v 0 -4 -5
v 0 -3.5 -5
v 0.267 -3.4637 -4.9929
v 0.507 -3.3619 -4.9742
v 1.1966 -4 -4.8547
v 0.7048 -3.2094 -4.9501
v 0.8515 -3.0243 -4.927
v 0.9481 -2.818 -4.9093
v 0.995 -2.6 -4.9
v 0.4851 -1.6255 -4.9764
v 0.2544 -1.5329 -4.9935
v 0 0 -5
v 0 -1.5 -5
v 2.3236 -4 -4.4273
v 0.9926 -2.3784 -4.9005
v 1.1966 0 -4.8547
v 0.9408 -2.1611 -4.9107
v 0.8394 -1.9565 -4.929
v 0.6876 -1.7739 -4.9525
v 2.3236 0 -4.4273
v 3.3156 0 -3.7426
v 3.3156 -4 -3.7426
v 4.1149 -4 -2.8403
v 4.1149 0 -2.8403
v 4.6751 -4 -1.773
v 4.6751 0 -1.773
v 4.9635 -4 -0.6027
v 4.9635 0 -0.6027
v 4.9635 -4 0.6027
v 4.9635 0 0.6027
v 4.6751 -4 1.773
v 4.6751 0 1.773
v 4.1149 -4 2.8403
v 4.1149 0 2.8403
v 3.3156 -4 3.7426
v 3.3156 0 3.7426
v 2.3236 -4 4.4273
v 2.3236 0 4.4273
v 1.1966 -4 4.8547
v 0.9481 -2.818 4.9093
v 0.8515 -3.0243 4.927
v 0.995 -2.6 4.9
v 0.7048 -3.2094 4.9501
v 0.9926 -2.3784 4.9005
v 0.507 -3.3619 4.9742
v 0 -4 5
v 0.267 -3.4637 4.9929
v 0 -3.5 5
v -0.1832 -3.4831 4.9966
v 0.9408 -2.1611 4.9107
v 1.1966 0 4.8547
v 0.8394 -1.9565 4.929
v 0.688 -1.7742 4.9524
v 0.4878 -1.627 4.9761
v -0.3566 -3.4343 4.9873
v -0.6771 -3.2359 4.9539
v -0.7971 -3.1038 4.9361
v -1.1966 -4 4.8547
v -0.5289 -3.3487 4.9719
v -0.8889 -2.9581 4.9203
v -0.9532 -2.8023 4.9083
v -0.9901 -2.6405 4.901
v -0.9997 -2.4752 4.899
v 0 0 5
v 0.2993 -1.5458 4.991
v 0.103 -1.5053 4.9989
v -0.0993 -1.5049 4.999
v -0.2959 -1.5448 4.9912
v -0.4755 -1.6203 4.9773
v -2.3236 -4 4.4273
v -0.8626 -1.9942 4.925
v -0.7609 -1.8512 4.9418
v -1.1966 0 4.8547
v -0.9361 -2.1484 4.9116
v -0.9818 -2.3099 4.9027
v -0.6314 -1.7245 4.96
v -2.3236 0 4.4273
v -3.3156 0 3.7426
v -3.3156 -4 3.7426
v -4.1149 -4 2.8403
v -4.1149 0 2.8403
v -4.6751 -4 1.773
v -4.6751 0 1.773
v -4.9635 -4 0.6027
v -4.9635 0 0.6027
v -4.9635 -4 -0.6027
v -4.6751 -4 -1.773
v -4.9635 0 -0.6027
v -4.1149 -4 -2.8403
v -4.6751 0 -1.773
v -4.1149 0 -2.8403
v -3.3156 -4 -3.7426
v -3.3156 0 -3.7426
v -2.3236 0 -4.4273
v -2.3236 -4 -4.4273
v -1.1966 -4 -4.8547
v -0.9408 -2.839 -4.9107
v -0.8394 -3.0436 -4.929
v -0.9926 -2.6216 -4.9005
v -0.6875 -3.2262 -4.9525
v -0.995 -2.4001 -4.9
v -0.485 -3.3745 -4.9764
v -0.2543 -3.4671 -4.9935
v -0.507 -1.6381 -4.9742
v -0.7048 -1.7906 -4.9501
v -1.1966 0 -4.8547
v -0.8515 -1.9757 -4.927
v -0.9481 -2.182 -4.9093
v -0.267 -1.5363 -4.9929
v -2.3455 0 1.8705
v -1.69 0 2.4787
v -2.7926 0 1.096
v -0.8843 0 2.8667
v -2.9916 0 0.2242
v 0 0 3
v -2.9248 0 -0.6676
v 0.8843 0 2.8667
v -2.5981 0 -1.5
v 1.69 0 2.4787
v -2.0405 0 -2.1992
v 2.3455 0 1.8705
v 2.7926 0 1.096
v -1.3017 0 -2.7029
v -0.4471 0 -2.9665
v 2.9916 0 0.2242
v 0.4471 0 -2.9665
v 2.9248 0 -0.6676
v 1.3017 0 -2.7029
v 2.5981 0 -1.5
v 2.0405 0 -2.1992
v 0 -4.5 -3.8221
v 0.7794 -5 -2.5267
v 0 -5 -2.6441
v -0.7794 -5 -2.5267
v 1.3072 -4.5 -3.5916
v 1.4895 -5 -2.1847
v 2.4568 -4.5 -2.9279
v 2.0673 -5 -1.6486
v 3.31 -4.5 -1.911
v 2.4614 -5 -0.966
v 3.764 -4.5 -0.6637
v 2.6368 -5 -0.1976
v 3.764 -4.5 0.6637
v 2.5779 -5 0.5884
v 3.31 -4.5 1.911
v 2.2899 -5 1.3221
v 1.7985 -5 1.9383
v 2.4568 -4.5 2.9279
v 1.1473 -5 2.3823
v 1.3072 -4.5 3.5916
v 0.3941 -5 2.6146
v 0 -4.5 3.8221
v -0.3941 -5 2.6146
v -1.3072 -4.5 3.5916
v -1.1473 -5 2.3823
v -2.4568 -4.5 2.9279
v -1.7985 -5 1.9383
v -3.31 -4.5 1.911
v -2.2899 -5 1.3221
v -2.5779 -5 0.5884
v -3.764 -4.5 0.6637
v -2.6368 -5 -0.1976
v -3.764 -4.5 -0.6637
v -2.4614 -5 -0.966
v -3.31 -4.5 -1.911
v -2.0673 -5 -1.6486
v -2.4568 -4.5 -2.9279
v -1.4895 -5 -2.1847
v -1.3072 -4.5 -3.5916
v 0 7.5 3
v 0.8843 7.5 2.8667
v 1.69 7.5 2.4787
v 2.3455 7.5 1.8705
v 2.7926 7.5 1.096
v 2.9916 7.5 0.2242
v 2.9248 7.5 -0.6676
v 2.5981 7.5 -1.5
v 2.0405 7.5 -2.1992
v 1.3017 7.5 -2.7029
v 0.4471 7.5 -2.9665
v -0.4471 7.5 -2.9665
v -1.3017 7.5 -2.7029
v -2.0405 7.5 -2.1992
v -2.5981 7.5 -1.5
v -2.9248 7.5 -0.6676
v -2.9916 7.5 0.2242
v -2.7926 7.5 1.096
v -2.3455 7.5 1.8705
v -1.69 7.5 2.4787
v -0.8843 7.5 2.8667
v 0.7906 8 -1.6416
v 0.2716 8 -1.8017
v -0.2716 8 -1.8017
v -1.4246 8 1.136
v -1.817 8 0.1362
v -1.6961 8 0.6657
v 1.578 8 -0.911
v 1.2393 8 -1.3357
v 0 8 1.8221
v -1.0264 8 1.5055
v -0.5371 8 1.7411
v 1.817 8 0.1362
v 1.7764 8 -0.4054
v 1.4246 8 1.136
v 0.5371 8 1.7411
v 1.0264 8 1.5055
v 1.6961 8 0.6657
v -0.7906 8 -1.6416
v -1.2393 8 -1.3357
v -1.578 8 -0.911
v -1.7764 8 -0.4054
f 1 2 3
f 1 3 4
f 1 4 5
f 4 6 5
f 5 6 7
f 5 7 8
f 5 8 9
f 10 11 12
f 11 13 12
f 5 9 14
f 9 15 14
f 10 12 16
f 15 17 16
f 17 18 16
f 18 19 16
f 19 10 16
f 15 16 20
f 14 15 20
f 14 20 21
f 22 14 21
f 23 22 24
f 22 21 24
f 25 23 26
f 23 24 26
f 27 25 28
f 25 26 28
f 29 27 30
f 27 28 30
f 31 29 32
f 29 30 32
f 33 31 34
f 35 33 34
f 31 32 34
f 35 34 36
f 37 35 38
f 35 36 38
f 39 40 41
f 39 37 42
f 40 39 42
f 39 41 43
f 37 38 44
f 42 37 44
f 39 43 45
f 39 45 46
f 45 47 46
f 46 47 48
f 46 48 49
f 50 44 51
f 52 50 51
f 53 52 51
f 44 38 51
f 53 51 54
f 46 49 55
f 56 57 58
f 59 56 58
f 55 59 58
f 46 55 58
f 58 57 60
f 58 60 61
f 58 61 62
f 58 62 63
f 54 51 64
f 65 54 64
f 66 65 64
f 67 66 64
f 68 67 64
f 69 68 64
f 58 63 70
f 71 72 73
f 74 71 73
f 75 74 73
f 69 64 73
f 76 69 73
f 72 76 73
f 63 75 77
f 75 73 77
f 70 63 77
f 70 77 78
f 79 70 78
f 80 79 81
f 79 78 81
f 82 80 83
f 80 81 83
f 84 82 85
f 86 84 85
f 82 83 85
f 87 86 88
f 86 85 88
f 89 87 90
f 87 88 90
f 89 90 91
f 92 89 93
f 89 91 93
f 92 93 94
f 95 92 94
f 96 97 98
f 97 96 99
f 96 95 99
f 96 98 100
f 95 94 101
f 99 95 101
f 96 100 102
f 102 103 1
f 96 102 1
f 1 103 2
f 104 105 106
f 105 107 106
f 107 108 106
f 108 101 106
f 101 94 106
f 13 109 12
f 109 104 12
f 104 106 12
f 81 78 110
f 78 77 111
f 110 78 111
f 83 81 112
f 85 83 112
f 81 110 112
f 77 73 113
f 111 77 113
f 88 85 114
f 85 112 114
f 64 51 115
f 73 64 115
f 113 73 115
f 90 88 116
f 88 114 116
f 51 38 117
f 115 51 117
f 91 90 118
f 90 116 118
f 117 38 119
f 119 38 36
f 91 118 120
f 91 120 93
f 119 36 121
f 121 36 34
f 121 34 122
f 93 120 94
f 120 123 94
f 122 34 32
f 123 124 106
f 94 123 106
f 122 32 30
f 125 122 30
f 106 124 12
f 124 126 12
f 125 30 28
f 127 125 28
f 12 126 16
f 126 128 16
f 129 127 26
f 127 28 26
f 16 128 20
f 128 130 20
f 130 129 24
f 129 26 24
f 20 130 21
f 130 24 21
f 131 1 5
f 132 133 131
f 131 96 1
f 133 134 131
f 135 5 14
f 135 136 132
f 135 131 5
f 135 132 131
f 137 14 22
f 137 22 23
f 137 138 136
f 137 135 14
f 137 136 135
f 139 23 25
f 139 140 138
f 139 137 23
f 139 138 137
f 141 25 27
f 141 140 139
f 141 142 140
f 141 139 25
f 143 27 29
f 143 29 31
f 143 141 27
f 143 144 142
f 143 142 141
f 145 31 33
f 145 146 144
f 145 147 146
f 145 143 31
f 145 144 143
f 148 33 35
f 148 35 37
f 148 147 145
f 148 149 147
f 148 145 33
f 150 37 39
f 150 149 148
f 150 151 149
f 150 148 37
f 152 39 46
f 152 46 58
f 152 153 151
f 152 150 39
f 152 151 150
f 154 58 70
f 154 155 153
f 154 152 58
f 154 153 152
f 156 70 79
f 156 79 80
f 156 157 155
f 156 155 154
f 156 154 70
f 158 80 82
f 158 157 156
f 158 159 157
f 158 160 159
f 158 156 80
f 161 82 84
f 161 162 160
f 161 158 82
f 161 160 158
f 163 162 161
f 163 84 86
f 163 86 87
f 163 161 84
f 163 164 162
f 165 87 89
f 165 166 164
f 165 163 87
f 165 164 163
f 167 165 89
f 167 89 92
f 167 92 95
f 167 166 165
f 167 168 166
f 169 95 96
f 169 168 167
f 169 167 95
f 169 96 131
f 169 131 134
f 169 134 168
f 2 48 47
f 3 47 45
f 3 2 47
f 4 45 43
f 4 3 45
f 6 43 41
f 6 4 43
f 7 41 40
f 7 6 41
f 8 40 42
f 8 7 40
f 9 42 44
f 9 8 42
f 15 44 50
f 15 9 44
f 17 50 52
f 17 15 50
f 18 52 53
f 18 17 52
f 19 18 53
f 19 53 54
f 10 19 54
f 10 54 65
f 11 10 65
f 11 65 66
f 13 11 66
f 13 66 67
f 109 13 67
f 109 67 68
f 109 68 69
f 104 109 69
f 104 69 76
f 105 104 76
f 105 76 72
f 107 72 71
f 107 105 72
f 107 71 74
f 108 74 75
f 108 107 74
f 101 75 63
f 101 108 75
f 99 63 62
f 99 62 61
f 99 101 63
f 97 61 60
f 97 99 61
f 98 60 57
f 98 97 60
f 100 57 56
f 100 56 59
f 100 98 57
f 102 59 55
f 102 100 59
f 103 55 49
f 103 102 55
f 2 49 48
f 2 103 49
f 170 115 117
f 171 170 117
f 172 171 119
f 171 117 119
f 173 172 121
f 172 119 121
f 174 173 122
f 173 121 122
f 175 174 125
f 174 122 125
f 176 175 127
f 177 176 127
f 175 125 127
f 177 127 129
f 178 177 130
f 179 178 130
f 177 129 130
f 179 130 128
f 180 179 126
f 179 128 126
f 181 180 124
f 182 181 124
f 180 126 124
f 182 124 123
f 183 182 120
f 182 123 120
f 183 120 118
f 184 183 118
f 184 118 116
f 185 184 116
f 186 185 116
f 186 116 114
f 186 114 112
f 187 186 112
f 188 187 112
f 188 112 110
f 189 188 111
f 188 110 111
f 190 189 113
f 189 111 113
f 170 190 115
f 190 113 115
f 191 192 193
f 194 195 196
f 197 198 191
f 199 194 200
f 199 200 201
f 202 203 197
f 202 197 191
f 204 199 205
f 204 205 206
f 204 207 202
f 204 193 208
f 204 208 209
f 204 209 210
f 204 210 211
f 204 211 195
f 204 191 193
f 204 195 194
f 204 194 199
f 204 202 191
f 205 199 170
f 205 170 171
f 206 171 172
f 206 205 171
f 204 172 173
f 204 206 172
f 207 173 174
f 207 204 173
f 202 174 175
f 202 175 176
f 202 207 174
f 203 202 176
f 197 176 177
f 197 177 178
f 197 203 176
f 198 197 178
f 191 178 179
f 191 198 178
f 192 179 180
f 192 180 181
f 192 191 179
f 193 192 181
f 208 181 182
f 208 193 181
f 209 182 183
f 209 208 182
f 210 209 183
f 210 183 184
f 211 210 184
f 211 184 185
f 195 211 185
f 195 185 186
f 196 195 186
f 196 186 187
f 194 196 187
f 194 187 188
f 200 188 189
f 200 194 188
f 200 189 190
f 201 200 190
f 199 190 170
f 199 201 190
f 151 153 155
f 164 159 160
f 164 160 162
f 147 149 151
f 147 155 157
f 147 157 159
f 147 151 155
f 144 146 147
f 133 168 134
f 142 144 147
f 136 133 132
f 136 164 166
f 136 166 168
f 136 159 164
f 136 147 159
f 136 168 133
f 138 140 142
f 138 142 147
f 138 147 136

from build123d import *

# Parameters (mm, degrees)
SKETCH1_R               = 3
BOSS_EXTRUDE1_DEPTH     = 8
SKETCH2_R               = 5
BOSS_EXTRUDE2_DEPTH     = 5
CUT_EXTRUDE1_DEPTH      = 11.677078252
CUT_EXTRUDE1_DEPTH_BACK = 11.677078252
SKETCH3_R               = 1
CHAMFER1_SIZE           = 1
CHAMFER1_SIZE2          = 2.355852366
CHAMFER2_SIZE           = 0.5
CHAMFER2_SIZE2          = 1.177926183


with BuildPart() as part:
    # Sketch1 → Boss-Extrude1 (new body)
    with BuildSketch(Plane(origin=(0, 0, 0), x_dir=(1, 0, 0), z_dir=(0, 1, 0))):
        with Locations(Location((0, 0, 0), (0, 0, 270))):
            Circle(SKETCH1_R)
    extrude(amount=BOSS_EXTRUDE1_DEPTH)

    # Sketch2 → Boss-Extrude2 (add)
    with BuildSketch(Plane.XZ):
        with Locations(Location((0, 0, 0), (0, 0, 270))):
            Circle(SKETCH2_R)
    extrude(amount=BOSS_EXTRUDE2_DEPTH)

    # Sketch3 → Cut-Extrude1 (cut, two sides: drawn at the far end of the back side and taken through both)
    with BuildSketch(Plane.XY.offset(-CUT_EXTRUDE1_DEPTH_BACK)):
        with Locations(Location((0, -2.5, 0), (0, 0, 270))):
            Circle(SKETCH3_R)
    extrude(amount=CUT_EXTRUDE1_DEPTH + CUT_EXTRUDE1_DEPTH_BACK, mode=Mode.SUBTRACT)

    # Chamfer1
    chamfer1_edges = [part.edges().sort_by_distance(p)[0] for p in [
        (0, -5, 5),
    ]]
    chamfer1_side = [part.faces().sort_by_distance(p)[0] for p in [
        (0, -2.5, 5),
    ]]
    chamfer(chamfer1_edges, length=CHAMFER1_SIZE, length2=CHAMFER1_SIZE2, reference=chamfer1_side[0])

    # Chamfer2
    chamfer2_edges = [part.edges().sort_by_distance(p)[0] for p in [
        (0, 8, -3),
    ]]
    chamfer2_side = [part.faces().sort_by_distance(p)[0] for p in [
        (0, 4, -3),
    ]]
    chamfer(chamfer2_edges, length=CHAMFER2_SIZE, length2=CHAMFER2_SIZE2, reference=chamfer2_side[0])


solid = part.part
